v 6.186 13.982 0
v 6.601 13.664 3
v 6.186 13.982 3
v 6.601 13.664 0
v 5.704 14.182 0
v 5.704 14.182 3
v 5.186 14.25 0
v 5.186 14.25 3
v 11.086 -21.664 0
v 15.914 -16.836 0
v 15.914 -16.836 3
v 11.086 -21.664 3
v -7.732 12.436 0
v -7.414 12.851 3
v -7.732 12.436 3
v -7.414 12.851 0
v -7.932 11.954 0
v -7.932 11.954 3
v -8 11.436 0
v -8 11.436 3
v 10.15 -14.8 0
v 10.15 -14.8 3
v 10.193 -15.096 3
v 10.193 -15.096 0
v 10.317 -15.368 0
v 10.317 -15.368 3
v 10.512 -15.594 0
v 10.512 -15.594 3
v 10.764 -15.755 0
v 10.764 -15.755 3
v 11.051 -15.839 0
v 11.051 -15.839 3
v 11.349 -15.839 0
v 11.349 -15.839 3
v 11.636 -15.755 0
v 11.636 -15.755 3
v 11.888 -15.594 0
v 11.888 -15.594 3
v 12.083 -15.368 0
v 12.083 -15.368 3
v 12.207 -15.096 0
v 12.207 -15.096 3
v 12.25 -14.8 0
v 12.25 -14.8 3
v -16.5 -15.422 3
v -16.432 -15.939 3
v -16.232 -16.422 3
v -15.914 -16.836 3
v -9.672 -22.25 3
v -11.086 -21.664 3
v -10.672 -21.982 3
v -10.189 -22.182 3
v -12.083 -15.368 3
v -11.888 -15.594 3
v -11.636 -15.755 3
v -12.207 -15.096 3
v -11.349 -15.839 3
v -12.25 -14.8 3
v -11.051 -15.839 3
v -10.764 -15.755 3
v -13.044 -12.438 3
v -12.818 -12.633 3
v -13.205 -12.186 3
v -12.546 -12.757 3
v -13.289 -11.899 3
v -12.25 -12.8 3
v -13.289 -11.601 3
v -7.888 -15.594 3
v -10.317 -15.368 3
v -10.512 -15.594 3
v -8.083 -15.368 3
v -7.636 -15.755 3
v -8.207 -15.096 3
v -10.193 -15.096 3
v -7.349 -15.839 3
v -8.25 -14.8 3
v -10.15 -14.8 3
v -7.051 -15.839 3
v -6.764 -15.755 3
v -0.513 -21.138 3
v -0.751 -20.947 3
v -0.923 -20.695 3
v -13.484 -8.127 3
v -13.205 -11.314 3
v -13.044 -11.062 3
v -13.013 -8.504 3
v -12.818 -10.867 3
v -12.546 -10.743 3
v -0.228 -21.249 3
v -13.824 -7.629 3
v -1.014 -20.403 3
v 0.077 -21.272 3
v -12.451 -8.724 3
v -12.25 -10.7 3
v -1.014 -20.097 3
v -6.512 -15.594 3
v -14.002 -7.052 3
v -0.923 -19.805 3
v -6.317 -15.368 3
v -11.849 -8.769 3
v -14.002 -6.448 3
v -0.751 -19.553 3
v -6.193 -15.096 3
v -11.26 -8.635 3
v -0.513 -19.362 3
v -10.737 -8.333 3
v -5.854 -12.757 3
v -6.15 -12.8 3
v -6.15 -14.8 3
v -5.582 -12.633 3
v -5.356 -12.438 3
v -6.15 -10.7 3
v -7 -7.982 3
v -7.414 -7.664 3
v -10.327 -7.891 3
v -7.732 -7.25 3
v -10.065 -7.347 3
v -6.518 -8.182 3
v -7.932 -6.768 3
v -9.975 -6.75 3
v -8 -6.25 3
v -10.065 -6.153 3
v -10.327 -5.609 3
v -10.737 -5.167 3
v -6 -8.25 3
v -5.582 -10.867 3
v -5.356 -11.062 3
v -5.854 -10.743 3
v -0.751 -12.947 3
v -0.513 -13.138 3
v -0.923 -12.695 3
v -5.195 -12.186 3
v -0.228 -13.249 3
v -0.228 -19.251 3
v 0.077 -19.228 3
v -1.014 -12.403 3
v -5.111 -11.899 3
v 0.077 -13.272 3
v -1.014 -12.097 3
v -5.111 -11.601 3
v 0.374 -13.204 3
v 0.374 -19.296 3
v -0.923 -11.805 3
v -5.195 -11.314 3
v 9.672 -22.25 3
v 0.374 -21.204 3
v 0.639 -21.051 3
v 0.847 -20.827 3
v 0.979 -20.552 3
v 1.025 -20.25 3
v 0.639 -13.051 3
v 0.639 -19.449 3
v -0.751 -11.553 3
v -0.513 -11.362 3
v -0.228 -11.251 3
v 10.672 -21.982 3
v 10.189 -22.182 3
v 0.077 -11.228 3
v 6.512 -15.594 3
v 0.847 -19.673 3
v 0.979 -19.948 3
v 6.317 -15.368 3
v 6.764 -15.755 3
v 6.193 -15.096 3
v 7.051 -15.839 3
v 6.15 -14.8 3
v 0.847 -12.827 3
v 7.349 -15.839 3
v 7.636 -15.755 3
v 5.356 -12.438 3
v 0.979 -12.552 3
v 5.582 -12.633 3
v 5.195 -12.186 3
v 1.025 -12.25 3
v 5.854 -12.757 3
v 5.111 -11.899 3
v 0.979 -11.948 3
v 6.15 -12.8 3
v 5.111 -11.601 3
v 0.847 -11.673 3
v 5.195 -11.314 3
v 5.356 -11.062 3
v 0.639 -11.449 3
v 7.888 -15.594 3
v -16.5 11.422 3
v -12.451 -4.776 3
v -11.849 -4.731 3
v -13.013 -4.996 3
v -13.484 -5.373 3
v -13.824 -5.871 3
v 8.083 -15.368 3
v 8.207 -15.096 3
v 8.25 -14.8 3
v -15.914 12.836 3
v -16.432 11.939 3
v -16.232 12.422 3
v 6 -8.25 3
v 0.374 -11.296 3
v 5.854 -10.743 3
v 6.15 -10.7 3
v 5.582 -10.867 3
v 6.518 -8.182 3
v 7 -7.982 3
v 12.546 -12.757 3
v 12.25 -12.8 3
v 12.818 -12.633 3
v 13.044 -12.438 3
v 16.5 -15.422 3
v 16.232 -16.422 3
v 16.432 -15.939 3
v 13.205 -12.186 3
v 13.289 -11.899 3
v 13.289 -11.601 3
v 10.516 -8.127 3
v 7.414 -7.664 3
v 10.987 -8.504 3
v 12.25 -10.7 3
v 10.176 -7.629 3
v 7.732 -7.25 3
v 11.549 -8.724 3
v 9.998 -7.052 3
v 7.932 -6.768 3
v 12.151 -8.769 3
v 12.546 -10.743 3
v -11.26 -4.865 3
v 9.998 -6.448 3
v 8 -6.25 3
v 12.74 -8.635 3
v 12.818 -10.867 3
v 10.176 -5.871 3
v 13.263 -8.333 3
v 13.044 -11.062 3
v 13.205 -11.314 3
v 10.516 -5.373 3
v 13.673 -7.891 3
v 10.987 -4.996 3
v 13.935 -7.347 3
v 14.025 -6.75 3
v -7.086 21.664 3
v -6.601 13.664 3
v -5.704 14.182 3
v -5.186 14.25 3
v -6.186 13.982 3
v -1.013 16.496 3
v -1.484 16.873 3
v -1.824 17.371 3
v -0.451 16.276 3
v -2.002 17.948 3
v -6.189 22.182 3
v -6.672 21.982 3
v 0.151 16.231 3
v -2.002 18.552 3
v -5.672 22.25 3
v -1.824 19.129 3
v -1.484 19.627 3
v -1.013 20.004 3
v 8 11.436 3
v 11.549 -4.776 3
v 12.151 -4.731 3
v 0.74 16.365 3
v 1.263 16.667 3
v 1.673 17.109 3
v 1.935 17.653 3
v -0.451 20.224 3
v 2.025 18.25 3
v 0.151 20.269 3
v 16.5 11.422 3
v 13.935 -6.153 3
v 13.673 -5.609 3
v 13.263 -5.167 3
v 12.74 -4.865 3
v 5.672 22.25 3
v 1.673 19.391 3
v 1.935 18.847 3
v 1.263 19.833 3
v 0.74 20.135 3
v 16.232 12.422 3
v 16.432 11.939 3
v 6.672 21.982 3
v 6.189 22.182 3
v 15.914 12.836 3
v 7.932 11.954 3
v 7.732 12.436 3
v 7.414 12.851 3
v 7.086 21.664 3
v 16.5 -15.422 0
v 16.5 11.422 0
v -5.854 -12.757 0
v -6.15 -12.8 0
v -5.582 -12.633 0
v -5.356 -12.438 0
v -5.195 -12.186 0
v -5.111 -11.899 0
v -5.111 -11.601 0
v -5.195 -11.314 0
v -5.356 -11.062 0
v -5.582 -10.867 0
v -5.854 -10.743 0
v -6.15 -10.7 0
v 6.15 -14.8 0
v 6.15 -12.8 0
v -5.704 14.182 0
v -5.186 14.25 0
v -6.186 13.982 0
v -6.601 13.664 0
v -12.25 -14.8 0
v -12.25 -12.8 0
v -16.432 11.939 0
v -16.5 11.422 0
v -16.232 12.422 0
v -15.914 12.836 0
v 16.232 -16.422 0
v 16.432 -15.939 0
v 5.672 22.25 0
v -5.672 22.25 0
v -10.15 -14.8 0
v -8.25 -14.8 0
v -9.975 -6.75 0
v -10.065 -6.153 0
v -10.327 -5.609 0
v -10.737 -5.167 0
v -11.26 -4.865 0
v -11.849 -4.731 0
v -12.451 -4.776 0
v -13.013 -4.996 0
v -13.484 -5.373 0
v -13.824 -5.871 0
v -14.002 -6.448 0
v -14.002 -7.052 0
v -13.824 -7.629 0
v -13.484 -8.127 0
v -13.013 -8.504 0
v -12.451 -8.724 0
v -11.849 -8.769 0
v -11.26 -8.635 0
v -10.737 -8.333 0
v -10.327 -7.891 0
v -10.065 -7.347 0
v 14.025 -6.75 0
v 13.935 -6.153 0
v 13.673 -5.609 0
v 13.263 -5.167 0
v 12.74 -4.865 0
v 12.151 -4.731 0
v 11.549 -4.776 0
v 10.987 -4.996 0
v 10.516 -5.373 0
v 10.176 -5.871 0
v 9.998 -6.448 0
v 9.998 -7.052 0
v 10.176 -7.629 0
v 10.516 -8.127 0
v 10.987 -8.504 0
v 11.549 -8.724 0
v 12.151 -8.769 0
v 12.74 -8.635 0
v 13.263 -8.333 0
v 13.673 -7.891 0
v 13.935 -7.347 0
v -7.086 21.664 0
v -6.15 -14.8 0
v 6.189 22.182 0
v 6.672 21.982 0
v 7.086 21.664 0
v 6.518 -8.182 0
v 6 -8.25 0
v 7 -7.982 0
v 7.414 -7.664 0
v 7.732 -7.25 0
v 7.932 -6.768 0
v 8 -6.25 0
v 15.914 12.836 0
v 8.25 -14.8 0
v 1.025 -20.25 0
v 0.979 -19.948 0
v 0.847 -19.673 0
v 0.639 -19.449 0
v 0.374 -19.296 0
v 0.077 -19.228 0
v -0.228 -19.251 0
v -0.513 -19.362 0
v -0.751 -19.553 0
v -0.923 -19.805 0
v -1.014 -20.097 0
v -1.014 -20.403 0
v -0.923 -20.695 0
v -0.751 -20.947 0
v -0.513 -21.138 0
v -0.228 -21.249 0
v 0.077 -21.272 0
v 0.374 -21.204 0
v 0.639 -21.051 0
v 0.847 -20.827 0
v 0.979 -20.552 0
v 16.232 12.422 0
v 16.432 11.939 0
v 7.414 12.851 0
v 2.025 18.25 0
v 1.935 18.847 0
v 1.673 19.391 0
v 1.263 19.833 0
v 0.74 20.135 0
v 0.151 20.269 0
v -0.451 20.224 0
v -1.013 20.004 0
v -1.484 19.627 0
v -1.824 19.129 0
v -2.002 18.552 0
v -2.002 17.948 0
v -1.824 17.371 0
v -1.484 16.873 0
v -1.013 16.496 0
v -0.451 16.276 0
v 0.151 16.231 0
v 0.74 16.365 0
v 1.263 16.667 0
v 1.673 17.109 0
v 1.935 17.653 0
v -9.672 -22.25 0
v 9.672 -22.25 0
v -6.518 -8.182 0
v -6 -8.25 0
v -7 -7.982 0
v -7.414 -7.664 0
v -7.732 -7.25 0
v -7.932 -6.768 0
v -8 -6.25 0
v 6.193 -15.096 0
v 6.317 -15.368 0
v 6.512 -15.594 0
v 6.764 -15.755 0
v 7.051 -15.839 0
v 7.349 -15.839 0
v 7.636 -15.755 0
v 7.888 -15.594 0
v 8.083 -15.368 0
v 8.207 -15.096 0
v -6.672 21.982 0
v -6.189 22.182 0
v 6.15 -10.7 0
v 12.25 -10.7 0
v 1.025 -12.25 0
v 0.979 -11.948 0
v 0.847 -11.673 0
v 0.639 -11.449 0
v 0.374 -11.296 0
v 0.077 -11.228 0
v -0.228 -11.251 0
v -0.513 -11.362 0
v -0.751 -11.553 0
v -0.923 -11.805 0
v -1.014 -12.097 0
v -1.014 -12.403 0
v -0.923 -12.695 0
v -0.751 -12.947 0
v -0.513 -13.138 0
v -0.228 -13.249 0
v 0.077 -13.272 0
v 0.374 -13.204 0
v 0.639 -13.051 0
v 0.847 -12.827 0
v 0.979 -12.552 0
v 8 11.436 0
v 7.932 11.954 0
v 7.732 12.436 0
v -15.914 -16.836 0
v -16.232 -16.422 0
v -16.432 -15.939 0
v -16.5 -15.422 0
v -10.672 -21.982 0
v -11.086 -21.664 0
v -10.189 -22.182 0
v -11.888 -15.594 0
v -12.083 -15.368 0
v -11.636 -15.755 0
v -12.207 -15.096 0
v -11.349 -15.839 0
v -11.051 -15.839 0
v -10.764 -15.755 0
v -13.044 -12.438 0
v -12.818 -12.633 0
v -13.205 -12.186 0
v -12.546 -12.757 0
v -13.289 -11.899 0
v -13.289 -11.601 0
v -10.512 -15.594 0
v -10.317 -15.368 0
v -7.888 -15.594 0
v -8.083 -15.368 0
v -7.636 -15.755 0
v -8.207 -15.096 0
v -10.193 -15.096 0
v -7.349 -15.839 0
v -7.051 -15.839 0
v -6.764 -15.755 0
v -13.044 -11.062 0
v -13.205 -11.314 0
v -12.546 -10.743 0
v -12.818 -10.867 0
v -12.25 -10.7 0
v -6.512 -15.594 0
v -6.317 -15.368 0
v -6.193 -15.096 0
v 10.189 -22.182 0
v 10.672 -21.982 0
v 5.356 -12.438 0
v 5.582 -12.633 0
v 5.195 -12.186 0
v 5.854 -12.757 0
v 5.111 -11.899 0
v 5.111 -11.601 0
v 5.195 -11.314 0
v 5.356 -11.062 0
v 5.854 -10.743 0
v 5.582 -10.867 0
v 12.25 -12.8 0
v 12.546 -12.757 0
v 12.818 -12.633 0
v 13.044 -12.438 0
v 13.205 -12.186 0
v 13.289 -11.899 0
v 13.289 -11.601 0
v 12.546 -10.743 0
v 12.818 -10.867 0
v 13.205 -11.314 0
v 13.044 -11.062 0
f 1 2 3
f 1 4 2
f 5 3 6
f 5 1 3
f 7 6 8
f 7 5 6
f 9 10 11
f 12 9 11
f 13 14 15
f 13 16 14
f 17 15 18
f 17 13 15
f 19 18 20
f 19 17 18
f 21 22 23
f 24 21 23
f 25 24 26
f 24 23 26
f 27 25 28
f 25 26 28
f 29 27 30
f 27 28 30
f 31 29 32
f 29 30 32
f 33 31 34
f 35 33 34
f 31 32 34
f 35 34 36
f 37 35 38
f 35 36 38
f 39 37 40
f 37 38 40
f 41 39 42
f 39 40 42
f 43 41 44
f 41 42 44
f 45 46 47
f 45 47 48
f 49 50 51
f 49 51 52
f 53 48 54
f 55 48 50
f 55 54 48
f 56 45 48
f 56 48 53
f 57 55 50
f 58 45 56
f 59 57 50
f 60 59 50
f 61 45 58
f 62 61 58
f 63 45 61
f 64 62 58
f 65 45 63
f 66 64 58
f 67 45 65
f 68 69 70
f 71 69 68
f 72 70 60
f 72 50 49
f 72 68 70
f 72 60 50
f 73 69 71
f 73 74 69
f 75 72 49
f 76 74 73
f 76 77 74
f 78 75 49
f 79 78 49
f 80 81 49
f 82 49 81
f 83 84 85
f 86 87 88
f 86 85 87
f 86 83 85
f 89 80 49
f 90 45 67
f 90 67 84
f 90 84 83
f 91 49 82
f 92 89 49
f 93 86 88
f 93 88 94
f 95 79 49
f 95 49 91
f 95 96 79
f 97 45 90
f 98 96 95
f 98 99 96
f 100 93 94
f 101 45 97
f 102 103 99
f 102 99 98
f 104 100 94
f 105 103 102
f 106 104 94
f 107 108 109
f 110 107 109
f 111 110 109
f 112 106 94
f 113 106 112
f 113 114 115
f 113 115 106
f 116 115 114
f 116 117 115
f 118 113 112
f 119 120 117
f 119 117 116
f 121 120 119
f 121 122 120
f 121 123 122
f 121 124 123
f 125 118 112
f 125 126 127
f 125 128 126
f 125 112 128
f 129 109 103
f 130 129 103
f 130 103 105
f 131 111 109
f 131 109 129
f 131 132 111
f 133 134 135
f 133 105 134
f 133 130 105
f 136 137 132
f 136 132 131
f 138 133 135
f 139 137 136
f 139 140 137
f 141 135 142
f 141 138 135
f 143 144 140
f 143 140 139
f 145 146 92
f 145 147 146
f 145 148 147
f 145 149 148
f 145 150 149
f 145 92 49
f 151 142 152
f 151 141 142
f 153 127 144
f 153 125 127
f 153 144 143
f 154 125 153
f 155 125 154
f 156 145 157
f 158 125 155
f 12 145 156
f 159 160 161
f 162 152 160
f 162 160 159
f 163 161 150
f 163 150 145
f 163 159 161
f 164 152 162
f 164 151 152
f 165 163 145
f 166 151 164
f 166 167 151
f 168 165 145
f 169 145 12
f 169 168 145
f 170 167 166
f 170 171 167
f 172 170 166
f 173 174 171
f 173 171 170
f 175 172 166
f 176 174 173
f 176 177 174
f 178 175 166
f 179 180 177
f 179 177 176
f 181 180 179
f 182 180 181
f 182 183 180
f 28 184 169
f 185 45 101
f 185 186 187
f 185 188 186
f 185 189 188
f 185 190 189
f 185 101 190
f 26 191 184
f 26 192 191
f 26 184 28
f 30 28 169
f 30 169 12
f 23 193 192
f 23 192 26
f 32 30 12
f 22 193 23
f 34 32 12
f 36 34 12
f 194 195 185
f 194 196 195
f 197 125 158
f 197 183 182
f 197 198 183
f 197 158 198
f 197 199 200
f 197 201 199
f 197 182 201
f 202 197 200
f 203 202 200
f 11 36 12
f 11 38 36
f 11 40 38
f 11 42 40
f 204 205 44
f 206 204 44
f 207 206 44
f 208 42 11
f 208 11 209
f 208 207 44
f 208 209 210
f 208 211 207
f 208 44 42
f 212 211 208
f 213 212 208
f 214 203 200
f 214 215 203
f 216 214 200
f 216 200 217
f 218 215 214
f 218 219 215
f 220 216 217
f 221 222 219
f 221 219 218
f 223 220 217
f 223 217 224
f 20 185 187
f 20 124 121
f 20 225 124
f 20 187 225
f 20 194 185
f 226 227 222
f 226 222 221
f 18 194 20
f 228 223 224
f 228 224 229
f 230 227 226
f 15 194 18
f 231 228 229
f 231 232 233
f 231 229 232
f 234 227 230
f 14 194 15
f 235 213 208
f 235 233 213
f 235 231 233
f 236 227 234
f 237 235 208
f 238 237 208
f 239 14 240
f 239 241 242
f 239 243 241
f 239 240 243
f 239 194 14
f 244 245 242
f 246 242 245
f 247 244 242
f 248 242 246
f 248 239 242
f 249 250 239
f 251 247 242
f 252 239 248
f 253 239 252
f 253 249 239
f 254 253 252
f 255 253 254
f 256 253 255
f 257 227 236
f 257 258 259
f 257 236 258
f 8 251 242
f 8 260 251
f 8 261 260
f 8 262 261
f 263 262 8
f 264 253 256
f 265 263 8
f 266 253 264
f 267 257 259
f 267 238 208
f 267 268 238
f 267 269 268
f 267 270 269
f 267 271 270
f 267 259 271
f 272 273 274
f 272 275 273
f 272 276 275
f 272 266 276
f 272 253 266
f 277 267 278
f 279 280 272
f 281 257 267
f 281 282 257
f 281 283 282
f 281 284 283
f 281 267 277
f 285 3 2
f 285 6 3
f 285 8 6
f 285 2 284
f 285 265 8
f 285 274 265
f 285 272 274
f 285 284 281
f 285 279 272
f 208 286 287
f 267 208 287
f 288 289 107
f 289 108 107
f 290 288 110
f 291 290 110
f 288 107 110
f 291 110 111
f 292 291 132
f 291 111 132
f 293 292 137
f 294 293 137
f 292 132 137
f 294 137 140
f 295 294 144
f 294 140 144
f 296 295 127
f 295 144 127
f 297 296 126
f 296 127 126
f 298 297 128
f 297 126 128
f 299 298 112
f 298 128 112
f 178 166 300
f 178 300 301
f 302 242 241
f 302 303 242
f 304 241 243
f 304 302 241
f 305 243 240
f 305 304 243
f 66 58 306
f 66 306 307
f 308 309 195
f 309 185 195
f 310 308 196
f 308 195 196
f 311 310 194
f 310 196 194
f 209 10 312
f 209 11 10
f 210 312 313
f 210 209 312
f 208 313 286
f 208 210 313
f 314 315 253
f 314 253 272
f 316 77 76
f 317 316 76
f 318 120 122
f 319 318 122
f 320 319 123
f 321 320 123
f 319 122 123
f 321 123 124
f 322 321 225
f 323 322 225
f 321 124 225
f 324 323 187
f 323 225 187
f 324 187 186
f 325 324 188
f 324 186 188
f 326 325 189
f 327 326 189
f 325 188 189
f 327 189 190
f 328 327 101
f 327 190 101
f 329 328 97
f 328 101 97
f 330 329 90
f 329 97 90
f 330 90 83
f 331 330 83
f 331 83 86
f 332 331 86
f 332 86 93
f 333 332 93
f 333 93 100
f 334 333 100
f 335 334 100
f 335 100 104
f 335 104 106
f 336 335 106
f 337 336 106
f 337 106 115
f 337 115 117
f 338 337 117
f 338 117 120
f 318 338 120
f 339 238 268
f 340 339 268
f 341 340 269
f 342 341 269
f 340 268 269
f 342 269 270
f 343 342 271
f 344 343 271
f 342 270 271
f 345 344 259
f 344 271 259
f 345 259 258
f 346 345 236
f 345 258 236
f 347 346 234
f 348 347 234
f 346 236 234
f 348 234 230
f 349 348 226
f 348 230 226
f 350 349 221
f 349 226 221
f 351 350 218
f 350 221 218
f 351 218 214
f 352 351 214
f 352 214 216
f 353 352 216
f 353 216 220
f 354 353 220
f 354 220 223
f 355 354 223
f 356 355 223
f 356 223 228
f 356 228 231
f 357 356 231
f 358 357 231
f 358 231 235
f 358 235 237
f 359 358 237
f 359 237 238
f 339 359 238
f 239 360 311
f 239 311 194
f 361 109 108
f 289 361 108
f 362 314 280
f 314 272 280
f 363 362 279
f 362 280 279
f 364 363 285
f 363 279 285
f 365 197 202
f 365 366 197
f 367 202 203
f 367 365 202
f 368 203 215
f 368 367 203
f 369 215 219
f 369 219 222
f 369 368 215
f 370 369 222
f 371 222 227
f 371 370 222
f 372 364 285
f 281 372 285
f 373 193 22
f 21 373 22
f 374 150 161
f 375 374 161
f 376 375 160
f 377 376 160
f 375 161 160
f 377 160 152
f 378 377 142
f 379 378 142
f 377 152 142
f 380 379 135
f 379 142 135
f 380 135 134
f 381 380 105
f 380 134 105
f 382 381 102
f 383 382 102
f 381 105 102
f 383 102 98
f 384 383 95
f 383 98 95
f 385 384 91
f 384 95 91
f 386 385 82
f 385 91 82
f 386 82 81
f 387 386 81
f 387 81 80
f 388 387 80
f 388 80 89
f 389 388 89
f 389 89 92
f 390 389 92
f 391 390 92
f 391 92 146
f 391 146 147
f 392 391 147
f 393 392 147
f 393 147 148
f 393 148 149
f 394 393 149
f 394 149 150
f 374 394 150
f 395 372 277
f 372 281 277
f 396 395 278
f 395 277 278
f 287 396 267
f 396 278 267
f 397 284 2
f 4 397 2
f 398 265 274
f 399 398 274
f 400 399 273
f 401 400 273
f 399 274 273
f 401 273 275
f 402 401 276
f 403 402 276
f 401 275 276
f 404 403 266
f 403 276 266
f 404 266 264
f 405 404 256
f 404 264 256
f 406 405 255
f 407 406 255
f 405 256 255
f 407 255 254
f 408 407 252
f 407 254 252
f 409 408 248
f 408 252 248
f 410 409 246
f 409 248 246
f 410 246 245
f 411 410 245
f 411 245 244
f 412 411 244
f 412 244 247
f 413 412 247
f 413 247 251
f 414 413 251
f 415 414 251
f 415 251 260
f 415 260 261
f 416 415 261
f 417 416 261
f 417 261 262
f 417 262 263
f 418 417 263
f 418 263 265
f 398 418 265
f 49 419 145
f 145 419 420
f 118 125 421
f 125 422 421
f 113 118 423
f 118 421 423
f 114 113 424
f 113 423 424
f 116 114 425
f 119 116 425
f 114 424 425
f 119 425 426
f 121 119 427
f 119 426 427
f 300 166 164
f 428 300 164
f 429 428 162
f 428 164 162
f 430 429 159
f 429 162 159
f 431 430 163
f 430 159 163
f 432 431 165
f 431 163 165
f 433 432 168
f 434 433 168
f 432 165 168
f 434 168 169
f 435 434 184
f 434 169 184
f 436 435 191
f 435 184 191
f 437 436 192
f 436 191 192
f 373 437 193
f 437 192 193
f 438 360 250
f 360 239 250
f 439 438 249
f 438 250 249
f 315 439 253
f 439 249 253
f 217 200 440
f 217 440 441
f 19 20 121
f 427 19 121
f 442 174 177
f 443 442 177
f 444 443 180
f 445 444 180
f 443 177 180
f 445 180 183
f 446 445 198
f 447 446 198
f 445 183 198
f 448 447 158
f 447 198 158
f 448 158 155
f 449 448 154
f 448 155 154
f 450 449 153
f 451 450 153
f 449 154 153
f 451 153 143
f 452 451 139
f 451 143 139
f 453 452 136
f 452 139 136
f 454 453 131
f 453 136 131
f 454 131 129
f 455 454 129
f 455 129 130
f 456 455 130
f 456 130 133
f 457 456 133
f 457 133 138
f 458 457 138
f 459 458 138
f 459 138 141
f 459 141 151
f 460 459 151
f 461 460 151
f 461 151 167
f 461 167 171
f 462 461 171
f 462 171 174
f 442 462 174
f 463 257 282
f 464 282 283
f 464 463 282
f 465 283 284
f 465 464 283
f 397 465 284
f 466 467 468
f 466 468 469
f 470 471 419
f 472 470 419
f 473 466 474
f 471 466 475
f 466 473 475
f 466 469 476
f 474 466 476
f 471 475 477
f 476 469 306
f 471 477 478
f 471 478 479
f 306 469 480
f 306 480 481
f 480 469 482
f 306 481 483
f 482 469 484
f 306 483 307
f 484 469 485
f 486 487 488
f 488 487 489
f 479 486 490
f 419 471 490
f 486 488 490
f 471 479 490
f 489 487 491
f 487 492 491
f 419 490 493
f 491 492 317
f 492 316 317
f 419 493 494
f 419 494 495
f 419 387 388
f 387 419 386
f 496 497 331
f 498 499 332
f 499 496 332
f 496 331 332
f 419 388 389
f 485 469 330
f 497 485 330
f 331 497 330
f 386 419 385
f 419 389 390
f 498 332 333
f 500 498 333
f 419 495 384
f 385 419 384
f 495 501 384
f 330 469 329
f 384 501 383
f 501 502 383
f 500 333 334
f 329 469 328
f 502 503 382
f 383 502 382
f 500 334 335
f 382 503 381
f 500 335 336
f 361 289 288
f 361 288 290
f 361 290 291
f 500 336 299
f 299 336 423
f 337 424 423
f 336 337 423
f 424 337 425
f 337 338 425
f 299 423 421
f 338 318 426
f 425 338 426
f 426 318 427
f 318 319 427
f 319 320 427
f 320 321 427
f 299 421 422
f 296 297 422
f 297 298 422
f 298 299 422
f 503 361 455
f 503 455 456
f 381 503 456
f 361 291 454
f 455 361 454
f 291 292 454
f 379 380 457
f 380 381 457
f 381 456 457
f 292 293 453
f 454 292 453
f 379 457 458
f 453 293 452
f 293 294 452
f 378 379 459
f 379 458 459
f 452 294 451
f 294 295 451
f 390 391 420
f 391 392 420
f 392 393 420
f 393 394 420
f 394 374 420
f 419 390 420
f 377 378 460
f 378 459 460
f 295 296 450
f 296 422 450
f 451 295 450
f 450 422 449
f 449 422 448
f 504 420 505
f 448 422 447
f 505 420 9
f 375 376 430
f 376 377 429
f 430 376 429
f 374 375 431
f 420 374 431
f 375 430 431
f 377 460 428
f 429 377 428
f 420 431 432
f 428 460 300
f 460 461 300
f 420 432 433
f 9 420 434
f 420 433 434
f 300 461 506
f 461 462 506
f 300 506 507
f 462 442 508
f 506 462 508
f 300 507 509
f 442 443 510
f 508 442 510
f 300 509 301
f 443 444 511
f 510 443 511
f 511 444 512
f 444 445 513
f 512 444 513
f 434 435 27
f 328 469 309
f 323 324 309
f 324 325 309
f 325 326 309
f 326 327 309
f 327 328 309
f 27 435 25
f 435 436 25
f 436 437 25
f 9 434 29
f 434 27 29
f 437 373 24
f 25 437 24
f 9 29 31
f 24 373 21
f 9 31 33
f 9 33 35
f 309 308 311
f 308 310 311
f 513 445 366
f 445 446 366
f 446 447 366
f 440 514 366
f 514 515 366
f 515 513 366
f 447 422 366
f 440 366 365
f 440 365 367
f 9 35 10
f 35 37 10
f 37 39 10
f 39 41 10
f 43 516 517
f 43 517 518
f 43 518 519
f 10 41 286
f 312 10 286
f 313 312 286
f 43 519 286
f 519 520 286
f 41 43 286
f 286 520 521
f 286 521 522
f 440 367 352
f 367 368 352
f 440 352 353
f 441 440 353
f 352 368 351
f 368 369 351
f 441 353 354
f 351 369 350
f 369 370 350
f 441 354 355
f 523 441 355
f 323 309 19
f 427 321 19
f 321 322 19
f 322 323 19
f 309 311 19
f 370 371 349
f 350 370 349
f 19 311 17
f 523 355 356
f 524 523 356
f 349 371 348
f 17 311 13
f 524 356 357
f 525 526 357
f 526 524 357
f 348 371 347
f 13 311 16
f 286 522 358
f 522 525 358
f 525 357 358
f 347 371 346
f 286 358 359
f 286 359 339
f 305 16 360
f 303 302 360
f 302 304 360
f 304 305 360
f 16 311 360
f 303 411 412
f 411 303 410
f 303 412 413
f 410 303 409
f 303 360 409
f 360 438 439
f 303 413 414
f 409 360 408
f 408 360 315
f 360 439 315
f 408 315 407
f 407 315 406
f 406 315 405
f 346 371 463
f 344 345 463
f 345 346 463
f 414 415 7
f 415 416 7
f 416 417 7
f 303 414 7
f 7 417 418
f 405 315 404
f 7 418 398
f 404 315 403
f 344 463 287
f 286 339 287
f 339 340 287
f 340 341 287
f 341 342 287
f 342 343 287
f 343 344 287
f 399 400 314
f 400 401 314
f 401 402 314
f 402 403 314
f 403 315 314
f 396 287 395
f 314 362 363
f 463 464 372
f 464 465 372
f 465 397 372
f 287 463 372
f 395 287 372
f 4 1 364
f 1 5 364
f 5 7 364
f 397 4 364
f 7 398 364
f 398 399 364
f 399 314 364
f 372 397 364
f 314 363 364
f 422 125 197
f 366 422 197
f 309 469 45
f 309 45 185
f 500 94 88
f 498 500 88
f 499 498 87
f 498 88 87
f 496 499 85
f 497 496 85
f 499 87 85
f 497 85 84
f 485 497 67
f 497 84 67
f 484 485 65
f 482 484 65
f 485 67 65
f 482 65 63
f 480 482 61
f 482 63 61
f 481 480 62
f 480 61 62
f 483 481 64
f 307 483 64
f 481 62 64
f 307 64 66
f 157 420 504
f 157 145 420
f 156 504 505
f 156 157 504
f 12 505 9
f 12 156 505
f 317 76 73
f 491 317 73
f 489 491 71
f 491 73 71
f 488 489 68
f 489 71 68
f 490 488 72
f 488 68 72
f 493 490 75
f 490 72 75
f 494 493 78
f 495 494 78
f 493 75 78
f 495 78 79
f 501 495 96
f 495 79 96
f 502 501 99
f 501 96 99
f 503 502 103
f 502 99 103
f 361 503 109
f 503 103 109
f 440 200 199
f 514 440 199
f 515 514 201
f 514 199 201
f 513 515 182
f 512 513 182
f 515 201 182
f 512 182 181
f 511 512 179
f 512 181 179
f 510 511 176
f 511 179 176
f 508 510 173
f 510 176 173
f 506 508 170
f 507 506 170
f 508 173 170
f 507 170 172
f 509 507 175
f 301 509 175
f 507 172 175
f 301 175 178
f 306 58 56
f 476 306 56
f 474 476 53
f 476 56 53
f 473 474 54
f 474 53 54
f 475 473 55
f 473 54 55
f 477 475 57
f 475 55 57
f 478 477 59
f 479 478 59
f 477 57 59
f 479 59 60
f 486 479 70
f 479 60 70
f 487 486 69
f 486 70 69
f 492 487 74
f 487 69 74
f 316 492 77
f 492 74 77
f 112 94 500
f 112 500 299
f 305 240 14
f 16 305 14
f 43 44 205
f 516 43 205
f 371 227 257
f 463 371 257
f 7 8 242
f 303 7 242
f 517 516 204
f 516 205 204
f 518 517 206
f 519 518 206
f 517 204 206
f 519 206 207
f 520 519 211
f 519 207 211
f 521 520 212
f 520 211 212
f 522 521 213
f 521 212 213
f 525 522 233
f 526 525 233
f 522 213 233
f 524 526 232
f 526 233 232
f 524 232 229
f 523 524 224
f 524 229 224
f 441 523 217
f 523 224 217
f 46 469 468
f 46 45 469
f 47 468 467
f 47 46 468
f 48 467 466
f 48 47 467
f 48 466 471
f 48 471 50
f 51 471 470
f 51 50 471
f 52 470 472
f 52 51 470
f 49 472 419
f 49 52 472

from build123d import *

# Parameters (mm, degrees)
SKETCH_1_W          = 33
SKETCH_1_H          = 44.5
EXTRUDE_1_DEPTH     = 3
SKETCH_2_R          = 2.025
SKETCH_2_R_2        = 1.025
CUT_EXTRUDE_1_DEPTH = 13
CHAMFER_1_SIZE      = 10
CUT_EXTRUDE_2_DEPTH = 13
FILLET_1_R          = 2
CHAMFER_2_SIZE      = 6
FILLET_2_R          = 2
SKETCH_4_W          = 6.1
SKETCH_4_H          = 4.1
CUT_EXTRUDE_3_DEPTH = 3
SKETCH_5_R          = 1.05
CUT_EXTRUDE_4_DEPTH = 3


with BuildPart() as part:
    # 草图1 → 凸台-拉伸1 (new body)
    with BuildSketch(Plane.XY):
        Rectangle(SKETCH_1_W, SKETCH_1_H)
    extrude(amount=EXTRUDE_1_DEPTH)

    # 草图2 → 切除-拉伸1 (cut)
    with BuildSketch(Plane.XY.offset(3)):
        with Locations((12, -6.75)):
            Circle(SKETCH_2_R)
        with Locations((-12, -6.75)):
            Circle(SKETCH_2_R)
        with Locations((0, 18.25)):
            Circle(SKETCH_2_R)
        with Locations((0, -12.25)):
            Circle(SKETCH_2_R_2)
        with Locations((0, -20.25)):
            Circle(SKETCH_2_R_2)
    extrude(amount=-CUT_EXTRUDE_1_DEPTH, mode=Mode.SUBTRACT)

    # 倒角1
    chamfer_1_edges = [part.edges().sort_by_distance(p)[0] for p in [
        (-16.5, 22.25, 1.5),
        (16.5, 22.25, 1.5),
    ]]
    chamfer(chamfer_1_edges, length=CHAMFER_1_SIZE)

    # 草图3 → 切除-拉伸2 (cut)
    with BuildSketch(Plane.XY.offset(3)):
        Polygon((-8, -8.25), (8, -8.25), (8, 12.264718626), (6.014718626, 14.25), (-6.014718626, 14.25), (-8, 12.264718626), align=None)
    extrude(amount=-CUT_EXTRUDE_2_DEPTH, mode=Mode.SUBTRACT)

    # 圆角1
    fillet_1_edges = [part.edges().sort_by_distance(p)[0] for p in [
        (-8, -8.25, 1.5),
        (-8, 12.264718626, 1.5),
        (-6.014718626, 14.25, 1.5),
        (6.014718626, 14.25, 1.5),
        (8, 12.264718626, 1.5),
        (8, -8.25, 1.5),
    ]]
    fillet(fillet_1_edges, radius=FILLET_1_R)

    # 倒角2
    chamfer_2_edges = [part.edges().sort_by_distance(p)[0] for p in [
        (16.5, -22.25, 1.5),
        (-16.5, -22.25, 1.5),
    ]]
    chamfer(chamfer_2_edges, length=CHAMFER_2_SIZE)

    # 圆角2
    fillet_2_edges = [part.edges().sort_by_distance(p)[0] for p in [
        (16.5, -16.25, 1.5),
        (-10.5, -22.25, 1.5),
        (10.5, -22.25, 1.5),
        (-16.5, -16.25, 1.5),
        (-6.5, 22.25, 1.5),
        (6.5, 22.25, 1.5),
        (16.5, 12.25, 1.5),
        (-16.5, 12.25, 1.5),
    ]]
    fillet(fillet_2_edges, radius=FILLET_2_R)

    # 草图4 → 切除-拉伸3 (cut)
    with BuildSketch(Plane.XY.offset(3)):
        with Locations((-9.2, -12.75)):
            Rectangle(SKETCH_4_W, SKETCH_4_H)
        with Locations((9.2, -12.75)):
            Rectangle(SKETCH_4_W, SKETCH_4_H)
    extrude(amount=-CUT_EXTRUDE_3_DEPTH, mode=Mode.SUBTRACT)

    # 草图5 → 切除-拉伸4 (cut)
    with BuildSketch(Plane.XY.offset(3)):
        with Locations((-11.2, -14.8)):
            Circle(SKETCH_5_R)
        with Locations((-7.2, -14.8)):
            Circle(SKETCH_5_R)
        with Locations((7.2, -14.8)):
            Circle(SKETCH_5_R)
        with Locations((11.2, -14.8)):
            Circle(SKETCH_5_R)
        with Locations((-12.25, -11.75)):
            Circle(SKETCH_5_R)
        with Locations((-6.15, -11.75)):
            Circle(SKETCH_5_R)
        with Locations((6.15, -11.75)):
            Circle(SKETCH_5_R)
        with Locations((12.25, -11.75)):
            Circle(SKETCH_5_R)
    extrude(amount=-CUT_EXTRUDE_4_DEPTH, mode=Mode.SUBTRACT)


solid = part.part
